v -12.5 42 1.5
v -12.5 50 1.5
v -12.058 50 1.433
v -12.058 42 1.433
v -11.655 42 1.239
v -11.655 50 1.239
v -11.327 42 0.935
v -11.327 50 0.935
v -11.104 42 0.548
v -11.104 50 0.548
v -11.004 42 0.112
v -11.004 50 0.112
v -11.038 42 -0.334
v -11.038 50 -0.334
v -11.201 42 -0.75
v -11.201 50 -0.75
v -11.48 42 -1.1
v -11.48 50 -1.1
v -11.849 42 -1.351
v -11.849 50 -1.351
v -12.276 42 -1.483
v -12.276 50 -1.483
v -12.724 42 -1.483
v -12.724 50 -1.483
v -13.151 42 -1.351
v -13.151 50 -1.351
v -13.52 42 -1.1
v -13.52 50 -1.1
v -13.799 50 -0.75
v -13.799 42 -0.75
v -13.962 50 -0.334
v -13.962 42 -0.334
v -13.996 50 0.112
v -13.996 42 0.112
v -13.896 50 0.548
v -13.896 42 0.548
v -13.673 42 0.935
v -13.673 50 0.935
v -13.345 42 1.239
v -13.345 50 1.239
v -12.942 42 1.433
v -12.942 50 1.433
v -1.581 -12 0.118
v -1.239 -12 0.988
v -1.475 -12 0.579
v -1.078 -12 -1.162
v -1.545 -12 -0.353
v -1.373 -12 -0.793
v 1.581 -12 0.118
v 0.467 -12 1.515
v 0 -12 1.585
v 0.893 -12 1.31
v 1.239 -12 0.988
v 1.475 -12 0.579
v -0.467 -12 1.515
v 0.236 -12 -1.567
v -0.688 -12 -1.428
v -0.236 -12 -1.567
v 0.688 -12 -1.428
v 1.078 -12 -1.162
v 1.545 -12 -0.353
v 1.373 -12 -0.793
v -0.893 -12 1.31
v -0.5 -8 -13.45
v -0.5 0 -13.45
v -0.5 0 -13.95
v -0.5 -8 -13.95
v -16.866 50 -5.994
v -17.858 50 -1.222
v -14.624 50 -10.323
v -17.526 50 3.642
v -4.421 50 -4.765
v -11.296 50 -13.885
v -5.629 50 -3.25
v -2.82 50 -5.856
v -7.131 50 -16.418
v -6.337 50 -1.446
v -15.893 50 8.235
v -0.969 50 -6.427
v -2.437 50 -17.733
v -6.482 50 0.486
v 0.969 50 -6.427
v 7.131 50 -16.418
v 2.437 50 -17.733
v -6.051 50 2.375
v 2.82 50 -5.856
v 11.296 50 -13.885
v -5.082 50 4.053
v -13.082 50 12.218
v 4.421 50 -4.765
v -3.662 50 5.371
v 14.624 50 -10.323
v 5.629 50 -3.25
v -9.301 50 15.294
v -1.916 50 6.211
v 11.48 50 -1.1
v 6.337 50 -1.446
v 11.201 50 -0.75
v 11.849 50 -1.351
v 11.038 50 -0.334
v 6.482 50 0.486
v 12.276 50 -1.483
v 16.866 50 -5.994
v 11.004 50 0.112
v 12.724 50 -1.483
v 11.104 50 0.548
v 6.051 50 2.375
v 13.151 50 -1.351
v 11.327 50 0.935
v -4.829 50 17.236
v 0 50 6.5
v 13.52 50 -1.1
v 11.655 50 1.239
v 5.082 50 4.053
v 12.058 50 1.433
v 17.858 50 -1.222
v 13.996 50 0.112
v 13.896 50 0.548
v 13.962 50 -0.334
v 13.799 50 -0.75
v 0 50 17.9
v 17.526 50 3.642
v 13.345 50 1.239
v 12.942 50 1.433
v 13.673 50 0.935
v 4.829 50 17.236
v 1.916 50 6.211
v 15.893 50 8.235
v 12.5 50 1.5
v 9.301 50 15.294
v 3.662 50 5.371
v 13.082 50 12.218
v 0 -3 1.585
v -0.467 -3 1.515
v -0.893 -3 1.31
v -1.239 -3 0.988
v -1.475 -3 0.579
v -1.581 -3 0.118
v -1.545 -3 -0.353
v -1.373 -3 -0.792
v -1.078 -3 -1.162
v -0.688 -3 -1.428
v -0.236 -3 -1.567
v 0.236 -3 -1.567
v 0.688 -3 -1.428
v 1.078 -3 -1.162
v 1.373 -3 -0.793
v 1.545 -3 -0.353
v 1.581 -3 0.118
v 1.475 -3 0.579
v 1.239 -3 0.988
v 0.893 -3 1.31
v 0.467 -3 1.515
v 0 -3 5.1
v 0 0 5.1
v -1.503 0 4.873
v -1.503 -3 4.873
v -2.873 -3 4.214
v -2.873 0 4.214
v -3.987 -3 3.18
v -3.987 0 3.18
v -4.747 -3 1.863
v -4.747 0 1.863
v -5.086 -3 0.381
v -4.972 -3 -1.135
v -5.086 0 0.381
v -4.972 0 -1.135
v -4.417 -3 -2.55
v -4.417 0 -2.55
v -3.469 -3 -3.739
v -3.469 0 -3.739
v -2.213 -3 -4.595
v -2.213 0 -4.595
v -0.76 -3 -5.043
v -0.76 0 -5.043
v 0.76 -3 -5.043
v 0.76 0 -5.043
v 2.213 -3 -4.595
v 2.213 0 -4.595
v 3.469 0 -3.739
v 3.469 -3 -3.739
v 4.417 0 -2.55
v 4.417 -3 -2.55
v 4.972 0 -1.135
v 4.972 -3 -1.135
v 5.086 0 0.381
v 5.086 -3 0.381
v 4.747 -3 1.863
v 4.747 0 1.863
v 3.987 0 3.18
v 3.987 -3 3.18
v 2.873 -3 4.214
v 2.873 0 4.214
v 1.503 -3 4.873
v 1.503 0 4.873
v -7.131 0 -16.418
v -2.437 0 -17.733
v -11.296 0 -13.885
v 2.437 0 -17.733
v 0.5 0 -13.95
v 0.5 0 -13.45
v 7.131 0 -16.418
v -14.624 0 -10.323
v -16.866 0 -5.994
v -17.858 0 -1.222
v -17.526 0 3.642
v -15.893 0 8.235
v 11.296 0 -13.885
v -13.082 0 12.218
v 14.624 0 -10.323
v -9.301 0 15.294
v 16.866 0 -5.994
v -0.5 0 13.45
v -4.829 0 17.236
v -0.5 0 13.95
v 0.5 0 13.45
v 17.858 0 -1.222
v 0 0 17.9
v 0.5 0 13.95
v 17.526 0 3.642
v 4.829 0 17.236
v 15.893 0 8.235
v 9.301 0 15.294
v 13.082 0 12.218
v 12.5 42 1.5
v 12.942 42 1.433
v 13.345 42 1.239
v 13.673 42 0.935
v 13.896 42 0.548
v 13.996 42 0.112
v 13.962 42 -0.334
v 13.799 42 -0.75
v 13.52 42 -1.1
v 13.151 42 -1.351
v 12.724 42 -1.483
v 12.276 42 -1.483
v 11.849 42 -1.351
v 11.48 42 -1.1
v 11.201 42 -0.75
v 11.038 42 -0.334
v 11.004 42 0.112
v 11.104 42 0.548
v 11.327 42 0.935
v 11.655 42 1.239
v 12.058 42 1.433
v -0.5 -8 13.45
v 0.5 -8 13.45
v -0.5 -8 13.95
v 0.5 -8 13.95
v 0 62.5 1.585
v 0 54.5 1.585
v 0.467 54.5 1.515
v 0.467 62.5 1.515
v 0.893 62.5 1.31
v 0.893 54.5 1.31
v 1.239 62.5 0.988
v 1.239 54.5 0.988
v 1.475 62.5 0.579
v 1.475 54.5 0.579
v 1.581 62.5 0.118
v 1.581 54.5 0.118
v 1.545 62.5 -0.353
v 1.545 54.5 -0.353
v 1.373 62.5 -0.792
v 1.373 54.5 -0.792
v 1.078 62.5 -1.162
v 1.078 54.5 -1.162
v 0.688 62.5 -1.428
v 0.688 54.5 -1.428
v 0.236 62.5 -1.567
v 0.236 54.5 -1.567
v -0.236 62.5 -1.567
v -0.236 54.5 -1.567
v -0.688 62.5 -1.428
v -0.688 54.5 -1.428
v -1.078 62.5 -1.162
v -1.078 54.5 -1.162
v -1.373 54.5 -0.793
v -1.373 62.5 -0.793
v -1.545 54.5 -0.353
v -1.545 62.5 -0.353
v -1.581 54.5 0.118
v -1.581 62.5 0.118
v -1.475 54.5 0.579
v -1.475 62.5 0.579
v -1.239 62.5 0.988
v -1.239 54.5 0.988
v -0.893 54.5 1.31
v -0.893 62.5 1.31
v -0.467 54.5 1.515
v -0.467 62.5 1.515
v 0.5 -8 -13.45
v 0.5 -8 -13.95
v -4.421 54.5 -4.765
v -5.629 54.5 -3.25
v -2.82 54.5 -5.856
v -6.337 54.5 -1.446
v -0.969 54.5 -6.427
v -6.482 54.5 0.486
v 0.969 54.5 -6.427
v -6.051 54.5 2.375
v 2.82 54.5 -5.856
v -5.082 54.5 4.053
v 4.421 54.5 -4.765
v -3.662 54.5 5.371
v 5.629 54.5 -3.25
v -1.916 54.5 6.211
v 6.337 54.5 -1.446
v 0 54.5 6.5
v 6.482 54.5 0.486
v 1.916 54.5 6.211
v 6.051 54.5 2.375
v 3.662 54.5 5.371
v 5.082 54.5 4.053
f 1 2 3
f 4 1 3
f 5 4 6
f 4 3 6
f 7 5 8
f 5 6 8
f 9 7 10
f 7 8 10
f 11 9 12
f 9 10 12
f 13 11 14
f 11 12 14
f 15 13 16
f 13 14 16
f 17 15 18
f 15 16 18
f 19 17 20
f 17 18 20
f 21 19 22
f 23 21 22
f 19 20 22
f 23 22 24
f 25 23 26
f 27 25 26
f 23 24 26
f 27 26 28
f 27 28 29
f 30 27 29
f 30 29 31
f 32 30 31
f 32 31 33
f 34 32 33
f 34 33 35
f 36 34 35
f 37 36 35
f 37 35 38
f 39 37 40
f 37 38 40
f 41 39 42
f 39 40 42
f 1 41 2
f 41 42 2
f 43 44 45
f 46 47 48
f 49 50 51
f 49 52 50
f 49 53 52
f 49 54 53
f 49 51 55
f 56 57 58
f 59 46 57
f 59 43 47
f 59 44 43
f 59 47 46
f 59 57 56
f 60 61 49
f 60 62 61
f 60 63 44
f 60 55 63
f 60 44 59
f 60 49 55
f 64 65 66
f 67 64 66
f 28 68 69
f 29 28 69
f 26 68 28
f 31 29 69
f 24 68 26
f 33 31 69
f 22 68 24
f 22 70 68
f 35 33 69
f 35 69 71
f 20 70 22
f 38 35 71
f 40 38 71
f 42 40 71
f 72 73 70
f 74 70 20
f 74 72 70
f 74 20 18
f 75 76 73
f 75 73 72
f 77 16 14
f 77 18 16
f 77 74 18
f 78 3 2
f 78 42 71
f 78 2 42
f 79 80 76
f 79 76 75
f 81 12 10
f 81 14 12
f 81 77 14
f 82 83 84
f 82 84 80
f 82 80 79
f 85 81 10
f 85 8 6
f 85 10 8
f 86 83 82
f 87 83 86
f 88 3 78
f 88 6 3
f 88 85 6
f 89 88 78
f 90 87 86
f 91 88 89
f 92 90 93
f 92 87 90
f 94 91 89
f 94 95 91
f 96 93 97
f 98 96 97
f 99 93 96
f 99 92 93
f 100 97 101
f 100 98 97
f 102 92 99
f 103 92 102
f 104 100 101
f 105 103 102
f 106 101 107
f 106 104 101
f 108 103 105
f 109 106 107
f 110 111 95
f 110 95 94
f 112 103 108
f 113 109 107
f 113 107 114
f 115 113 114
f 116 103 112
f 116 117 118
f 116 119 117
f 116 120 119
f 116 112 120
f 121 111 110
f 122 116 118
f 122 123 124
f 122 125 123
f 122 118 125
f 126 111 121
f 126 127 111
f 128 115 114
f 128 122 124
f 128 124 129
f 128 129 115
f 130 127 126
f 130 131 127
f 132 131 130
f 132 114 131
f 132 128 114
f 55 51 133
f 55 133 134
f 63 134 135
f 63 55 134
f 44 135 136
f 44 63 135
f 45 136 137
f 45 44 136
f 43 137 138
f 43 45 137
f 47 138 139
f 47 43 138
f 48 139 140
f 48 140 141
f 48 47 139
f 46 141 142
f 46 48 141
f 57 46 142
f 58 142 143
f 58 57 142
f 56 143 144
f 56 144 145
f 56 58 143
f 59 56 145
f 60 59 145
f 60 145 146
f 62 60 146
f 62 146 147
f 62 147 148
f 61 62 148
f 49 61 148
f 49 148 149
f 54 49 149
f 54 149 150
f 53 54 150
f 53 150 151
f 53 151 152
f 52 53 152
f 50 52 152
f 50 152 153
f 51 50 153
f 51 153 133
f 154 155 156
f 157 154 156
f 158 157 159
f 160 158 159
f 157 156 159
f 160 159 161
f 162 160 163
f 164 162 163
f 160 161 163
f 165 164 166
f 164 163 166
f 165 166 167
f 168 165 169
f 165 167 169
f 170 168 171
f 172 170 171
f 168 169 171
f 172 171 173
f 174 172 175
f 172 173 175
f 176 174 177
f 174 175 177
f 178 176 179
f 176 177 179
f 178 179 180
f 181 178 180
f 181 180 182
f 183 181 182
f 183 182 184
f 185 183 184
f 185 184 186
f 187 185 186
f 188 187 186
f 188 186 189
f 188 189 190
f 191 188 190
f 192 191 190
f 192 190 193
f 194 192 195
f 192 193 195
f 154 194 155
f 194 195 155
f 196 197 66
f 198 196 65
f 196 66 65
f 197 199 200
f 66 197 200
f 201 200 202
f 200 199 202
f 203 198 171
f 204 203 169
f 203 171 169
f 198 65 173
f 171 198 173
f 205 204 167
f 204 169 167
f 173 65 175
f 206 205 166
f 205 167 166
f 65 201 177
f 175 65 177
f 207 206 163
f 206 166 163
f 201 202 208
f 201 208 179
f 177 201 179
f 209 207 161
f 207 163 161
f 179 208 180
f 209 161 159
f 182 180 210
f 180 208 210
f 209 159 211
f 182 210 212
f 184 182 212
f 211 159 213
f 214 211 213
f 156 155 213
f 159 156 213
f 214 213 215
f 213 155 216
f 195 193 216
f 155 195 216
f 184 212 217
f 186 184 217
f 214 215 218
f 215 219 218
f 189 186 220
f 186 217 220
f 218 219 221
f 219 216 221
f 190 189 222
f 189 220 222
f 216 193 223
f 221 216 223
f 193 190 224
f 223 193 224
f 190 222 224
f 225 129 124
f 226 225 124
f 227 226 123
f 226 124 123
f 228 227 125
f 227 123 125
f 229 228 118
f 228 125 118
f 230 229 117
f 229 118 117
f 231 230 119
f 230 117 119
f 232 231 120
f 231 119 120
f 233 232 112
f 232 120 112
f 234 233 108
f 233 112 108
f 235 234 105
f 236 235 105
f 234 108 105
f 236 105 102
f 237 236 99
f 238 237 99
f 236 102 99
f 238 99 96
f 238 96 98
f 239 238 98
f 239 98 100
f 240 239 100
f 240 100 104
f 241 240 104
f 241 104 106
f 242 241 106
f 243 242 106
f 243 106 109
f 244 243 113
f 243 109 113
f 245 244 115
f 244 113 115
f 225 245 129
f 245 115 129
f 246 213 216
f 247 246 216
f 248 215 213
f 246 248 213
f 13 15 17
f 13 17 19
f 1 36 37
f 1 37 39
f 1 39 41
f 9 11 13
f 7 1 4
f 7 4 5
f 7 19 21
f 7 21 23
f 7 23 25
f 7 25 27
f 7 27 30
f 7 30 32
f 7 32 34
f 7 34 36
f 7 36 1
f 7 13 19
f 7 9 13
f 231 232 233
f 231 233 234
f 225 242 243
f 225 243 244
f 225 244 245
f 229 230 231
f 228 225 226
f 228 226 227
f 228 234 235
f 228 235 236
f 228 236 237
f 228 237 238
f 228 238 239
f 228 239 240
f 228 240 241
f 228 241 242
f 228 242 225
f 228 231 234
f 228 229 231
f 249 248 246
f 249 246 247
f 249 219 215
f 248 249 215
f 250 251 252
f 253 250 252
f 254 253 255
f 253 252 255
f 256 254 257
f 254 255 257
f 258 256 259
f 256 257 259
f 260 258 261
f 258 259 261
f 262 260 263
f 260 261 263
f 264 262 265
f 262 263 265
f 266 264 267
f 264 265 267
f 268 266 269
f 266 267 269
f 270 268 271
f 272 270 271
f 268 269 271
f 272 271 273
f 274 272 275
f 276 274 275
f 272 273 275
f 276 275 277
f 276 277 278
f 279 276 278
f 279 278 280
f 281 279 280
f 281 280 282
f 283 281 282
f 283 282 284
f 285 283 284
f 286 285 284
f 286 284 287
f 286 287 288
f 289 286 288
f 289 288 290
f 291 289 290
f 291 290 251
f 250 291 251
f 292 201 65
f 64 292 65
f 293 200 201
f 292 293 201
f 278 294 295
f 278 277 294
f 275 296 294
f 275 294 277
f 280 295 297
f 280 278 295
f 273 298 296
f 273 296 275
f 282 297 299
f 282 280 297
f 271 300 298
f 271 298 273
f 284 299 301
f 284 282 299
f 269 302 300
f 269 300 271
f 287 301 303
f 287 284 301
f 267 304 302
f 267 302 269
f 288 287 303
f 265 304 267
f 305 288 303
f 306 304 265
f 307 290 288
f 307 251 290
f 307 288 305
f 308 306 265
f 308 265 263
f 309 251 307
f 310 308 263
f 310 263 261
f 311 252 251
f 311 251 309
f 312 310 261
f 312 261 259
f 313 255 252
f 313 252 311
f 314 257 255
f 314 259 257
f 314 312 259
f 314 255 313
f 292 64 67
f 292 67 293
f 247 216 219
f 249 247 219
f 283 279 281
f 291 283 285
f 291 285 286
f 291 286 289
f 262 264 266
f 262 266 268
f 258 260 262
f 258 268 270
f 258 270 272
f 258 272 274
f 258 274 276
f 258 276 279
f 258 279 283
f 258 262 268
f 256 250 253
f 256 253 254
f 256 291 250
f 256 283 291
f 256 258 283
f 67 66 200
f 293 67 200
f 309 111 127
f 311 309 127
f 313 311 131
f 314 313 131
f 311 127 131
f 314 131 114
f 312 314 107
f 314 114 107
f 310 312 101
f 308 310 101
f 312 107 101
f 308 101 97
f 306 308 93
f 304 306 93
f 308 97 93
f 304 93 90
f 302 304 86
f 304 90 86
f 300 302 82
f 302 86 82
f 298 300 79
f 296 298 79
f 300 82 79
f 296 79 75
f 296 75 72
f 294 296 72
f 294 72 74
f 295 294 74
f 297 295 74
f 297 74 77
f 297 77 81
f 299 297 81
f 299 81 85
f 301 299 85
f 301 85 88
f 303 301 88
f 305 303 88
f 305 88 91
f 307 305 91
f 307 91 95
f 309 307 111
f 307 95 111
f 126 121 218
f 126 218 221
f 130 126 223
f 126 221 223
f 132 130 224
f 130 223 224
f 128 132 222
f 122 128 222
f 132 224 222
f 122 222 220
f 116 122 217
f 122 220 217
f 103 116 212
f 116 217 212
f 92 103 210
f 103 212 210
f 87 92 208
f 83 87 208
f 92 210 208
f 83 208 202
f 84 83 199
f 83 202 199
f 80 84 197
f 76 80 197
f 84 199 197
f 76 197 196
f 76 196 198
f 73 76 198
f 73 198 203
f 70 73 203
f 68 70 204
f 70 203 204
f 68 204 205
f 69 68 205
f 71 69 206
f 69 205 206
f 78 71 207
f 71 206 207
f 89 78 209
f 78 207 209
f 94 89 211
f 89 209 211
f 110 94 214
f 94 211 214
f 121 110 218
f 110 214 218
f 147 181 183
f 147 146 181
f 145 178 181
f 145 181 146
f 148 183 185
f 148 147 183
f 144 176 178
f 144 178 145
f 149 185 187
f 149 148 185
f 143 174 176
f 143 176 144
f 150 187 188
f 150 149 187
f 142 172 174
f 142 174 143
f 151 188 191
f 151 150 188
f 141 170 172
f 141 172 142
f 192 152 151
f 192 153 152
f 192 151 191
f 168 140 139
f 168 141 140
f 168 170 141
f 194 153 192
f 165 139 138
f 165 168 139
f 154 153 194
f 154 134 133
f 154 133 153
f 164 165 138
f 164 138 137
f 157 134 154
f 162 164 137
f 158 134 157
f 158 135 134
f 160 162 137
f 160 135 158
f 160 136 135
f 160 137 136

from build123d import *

# Parameters (mm, degrees)
SKETCH1_R           = 17.9
BOSS_EXTRUDE1_DEPTH = 50
SKETCH2_R           = 6.5
BOSS_EXTRUDE2_DEPTH = 4.5
SKETCH3_R           = 1.585
BOSS_EXTRUDE3_DEPTH = 12.5
SKETCH4_R           = 5.1
BOSS_EXTRUDE4_DEPTH = 3
BOSS_EXTRUDE5_START = 12.5
SKETCH5_R           = 1.585
BOSS_EXTRUDE5_DEPTH = 12.5
BOSS_EXTRUDE6_DEPTH = 8
SKETCH7_R           = 1.5
CUT_EXTRUDE1_DEPTH  = 8
CUT_EXTRUDE2_START  = -4.5
SKETCH8_R           = 1.585
CUT_EXTRUDE2_DEPTH  = 4.5
SKETCH9_R           = 1.585
CUT_EXTRUDE3_DEPTH  = 3.5


with BuildPart() as part:
    # Sketch1 → Boss-Extrude1 (new body)
    with BuildSketch(Plane(origin=(0, 0, 0), x_dir=(1, 0, 0), z_dir=(0, 1, 0))):
        with Locations(Location((0, 0, 0), (0, 0, 270))):
            Circle(SKETCH1_R)
    extrude(amount=BOSS_EXTRUDE1_DEPTH)

    # Sketch2 → Boss-Extrude2 (add)
    with BuildSketch(Plane(origin=(0, 50, 0), x_dir=(1, 0, 0), z_dir=(0, 1, 0))):
        with Locations(Location((0, 0, 0), (0, 0, 270))):
            Circle(SKETCH2_R)
    extrude(amount=BOSS_EXTRUDE2_DEPTH)

    # Sketch3 → Boss-Extrude3 (add)
    with BuildSketch(Plane(origin=(0, 54.5, 0), x_dir=(1, 0, 0), z_dir=(0, 1, 0))):
        with Locations(Location((0, 0, 0), (0, 0, 270))):
            Circle(SKETCH3_R)
    extrude(amount=BOSS_EXTRUDE3_DEPTH)

    # Sketch4 → Boss-Extrude4 (add)
    with BuildSketch(Plane.XZ):
        with Locations(Location((0, 0, 0), (0, 0, 90))):
            Circle(SKETCH4_R)
    extrude(amount=BOSS_EXTRUDE4_DEPTH)

    # Sketch5 → Boss-Extrude5 (add)
    with BuildSketch(Plane(origin=(0, -3, 0), x_dir=(-1, 0, 0), z_dir=(0, -1, 0)).offset(BOSS_EXTRUDE5_START)):
        with Locations(Location((0, 0, 0), (0, 0, 270))):
            Circle(SKETCH5_R)
    extrude(amount=-BOSS_EXTRUDE5_DEPTH)

    # Sketch6 → Boss-Extrude6 (add)
    with BuildSketch(Plane.XZ):
        Polygon((0, -13.95), (0, -13.7), (0, -13.45), (-0.5, -13.45), (-0.5, -13.95), align=None)
        Polygon((0, -13.45), (0, -13.7), (0, -13.95), (0.5, -13.95), (0.5, -13.45), align=None)
        Polygon((0, 13.45), (0, 13.7), (0, 13.95), (-0.5, 13.95), (-0.5, 13.45), align=None)
        Polygon((0, 13.95), (0, 13.7), (0, 13.45), (0.5, 13.45), (0.5, 13.95), align=None)
    extrude(amount=BOSS_EXTRUDE6_DEPTH)

    # Sketch7 → Cut-Extrude1 (cut)
    with BuildSketch(Plane(origin=(0, 50, 0), x_dir=(1, 0, 0), z_dir=(0, 1, 0))):
        with Locations(Location((12.5, 0, 0), (0, 0, 270))):
            Circle(SKETCH7_R)
        with Locations(Location((-12.5, 0, 0), (0, 0, 270))):
            Circle(SKETCH7_R)
    extrude(amount=-CUT_EXTRUDE1_DEPTH, mode=Mode.SUBTRACT)

    # Sketch8 → Cut-Extrude2 (cut)
    with BuildSketch(Plane(origin=(0, 67, 0), x_dir=(1, 0, 0), z_dir=(0, 1, 0)).offset(CUT_EXTRUDE2_START)):
        with Locations(Location((0, 0, 0), (0, 0, 270))):
            Circle(SKETCH8_R)
    extrude(amount=CUT_EXTRUDE2_DEPTH, mode=Mode.SUBTRACT)

    # Sketch9 → Cut-Extrude3 (cut)
    with BuildSketch(Plane.XZ.offset(15.5)):
        with Locations(Location((0, 0, 0), (0, 0, 270))):
            Circle(SKETCH9_R)
    extrude(amount=-CUT_EXTRUDE3_DEPTH, mode=Mode.SUBTRACT)


solid = part.part
